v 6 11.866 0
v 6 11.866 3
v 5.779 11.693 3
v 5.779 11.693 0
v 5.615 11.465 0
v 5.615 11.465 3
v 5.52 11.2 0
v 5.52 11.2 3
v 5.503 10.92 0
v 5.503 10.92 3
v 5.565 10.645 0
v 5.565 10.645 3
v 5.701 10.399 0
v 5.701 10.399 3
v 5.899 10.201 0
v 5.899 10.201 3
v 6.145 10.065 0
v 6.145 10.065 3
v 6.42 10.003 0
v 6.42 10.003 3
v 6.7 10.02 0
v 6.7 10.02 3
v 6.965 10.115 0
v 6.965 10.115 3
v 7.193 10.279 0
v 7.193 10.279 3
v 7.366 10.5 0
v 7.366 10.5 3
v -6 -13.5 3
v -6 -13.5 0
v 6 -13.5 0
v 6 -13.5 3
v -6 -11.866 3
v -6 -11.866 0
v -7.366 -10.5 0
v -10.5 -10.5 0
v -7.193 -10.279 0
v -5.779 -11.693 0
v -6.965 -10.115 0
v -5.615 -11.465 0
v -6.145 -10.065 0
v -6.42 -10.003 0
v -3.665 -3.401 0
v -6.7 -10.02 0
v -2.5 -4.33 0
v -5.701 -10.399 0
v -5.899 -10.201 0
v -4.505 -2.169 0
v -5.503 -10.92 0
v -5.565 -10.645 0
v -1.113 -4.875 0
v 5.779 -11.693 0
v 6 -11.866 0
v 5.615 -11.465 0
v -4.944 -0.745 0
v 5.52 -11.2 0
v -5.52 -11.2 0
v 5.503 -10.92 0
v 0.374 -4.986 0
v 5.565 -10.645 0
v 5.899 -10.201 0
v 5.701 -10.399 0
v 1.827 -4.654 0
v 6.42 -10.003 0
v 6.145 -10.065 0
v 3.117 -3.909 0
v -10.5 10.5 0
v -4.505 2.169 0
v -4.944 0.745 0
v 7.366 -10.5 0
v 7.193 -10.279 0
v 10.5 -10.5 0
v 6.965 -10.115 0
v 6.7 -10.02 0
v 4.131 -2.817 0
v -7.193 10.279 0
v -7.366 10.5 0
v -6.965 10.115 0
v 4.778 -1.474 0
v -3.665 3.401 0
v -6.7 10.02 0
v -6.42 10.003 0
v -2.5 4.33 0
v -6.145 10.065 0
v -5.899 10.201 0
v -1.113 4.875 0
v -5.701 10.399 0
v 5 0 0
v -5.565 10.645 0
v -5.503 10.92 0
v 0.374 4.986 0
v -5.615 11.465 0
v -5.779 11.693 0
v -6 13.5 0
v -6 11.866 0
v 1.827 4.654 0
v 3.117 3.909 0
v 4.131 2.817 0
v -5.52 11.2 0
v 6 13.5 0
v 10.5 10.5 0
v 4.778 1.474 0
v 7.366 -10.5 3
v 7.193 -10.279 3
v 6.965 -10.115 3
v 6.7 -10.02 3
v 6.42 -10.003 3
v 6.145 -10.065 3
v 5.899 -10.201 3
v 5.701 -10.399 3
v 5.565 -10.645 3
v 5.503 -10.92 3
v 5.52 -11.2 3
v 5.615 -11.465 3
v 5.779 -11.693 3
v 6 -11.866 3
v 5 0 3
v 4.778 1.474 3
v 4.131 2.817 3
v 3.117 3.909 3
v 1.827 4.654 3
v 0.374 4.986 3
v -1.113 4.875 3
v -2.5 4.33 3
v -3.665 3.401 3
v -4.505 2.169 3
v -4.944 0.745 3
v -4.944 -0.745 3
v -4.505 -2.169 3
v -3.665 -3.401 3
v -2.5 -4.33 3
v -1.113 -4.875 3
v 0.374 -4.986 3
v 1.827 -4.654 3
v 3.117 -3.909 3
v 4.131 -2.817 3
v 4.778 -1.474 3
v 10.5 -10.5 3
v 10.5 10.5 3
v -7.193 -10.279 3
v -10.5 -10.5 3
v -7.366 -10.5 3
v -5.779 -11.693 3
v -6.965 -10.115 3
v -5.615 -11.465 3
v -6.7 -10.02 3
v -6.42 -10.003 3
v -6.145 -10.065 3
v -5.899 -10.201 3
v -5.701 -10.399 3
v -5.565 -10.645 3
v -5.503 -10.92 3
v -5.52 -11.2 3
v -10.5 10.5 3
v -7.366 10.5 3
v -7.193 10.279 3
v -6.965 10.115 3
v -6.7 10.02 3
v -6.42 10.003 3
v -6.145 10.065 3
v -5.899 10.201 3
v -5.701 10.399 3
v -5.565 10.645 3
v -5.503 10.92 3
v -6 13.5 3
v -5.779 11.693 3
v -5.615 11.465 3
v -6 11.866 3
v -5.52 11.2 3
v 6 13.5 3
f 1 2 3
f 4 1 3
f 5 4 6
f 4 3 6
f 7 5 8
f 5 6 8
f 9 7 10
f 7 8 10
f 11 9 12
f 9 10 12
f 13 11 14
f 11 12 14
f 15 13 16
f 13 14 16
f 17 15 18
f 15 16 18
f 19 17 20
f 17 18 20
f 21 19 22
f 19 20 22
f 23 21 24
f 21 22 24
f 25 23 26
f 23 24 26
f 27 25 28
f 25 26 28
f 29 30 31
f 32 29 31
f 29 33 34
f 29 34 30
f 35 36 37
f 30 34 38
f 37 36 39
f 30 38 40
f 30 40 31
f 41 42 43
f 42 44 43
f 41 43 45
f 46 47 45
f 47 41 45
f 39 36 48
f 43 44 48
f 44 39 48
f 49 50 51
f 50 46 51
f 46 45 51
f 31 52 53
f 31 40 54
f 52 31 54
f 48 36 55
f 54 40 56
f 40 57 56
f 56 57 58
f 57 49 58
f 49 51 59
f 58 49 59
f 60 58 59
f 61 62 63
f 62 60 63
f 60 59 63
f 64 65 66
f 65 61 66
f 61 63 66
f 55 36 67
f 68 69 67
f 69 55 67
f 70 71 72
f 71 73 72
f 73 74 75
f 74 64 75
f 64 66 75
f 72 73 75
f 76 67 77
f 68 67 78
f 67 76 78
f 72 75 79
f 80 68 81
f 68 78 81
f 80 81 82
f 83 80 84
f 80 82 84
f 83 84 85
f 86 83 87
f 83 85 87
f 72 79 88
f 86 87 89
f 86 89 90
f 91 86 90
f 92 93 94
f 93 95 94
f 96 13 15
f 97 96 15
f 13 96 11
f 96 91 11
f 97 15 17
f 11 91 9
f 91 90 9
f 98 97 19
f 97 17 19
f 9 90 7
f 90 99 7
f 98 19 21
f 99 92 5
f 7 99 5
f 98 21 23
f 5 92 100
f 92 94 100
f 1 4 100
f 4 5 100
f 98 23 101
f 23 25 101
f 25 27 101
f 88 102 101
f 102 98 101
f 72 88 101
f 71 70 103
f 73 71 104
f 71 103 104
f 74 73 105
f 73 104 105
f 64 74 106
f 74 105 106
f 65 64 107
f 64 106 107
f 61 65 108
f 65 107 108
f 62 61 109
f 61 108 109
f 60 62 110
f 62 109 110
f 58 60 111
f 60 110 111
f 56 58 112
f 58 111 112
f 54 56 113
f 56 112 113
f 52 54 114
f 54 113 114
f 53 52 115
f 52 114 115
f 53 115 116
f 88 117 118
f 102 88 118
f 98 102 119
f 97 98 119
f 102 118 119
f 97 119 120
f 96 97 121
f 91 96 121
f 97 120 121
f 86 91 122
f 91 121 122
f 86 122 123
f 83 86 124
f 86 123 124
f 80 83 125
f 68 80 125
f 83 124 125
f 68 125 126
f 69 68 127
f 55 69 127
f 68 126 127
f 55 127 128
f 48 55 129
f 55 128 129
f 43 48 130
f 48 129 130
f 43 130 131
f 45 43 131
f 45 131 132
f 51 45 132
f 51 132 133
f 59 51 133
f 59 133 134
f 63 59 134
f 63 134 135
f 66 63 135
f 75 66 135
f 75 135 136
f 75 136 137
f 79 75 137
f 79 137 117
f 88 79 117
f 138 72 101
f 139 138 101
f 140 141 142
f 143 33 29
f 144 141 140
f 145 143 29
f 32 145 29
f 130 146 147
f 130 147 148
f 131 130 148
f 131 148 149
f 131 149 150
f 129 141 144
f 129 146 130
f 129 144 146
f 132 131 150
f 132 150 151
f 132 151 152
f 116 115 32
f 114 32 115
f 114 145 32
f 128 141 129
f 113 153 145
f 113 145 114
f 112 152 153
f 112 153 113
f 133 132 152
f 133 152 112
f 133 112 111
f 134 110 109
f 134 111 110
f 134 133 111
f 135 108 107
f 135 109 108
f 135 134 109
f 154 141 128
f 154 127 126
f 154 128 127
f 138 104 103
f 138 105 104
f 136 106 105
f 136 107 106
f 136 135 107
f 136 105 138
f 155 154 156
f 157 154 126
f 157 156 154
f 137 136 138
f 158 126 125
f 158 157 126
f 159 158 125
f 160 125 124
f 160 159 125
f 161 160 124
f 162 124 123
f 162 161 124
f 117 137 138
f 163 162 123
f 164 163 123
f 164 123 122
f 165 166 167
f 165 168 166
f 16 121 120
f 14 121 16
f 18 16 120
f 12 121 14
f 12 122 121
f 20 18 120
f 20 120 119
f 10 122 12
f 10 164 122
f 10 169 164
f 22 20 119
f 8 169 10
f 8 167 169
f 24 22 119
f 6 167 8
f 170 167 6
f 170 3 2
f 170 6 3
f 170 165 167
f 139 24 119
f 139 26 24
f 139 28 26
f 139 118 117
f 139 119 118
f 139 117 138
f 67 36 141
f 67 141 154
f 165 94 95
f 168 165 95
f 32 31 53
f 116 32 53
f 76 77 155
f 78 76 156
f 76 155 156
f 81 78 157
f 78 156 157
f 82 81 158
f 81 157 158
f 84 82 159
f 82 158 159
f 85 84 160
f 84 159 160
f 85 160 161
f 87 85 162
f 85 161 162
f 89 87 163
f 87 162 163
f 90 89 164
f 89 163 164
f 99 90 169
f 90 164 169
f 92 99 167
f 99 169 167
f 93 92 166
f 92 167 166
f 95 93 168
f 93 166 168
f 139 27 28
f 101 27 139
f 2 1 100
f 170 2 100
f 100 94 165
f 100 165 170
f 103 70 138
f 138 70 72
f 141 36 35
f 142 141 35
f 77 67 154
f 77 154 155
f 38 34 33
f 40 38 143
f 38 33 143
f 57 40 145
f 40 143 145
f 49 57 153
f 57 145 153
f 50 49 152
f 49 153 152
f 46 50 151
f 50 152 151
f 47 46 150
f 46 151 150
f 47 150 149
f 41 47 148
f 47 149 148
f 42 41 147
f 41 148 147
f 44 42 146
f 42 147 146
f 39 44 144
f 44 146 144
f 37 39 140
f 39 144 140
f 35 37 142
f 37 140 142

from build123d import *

# Parameters (mm, degrees)
SKETCH_1_W          = 12
SKETCH_1_H          = 3
SKETCH_1_H_2        = 21
SKETCH_1_W_2        = 4.5
EXTRUDE_1_DEPTH     = 3
SKETCH_2_R          = 5
CUT_EXTRUDE_1_DEPTH = 18.363755354
SKETCH_3_R          = 1
CUT_EXTRUDE_2_DEPTH = 18.363755354


with BuildPart() as part:
    # 草图1 → 凸台-拉伸1 (new body)
    with BuildSketch(Plane.XY):
        with Locations((0, 12)):
            Rectangle(SKETCH_1_W, SKETCH_1_H)
        Rectangle(SKETCH_1_W, SKETCH_1_H_2)
        with Locations((8.25, 0)):
            Rectangle(SKETCH_1_W_2, SKETCH_1_H_2)
        with Locations((0, -12)):
            Rectangle(SKETCH_1_W, SKETCH_1_H)
        with Locations((-8.25, 0)):
            Rectangle(SKETCH_1_W_2, SKETCH_1_H_2)
    extrude(amount=EXTRUDE_1_DEPTH)

    # 草图2 → 切除-拉伸1 (cut, through all)
    with BuildSketch(Plane.XY.offset(3)):
        Circle(SKETCH_2_R)
    extrude(amount=-CUT_EXTRUDE_1_DEPTH, mode=Mode.SUBTRACT)

    # 草图3 → 切除-拉伸2 (cut, through all)
    with BuildSketch(Plane.XY.offset(3)):
        with Locations((-6.5, 11)):
            Circle(SKETCH_3_R)
        with Locations((6.5, 11)):
            Circle(SKETCH_3_R)
        with Locations((6.5, -11)):
            Circle(SKETCH_3_R)
        with Locations((-6.5, -11)):
            Circle(SKETCH_3_R)
    extrude(amount=-CUT_EXTRUDE_2_DEPTH, mode=Mode.SUBTRACT)


solid = part.part
